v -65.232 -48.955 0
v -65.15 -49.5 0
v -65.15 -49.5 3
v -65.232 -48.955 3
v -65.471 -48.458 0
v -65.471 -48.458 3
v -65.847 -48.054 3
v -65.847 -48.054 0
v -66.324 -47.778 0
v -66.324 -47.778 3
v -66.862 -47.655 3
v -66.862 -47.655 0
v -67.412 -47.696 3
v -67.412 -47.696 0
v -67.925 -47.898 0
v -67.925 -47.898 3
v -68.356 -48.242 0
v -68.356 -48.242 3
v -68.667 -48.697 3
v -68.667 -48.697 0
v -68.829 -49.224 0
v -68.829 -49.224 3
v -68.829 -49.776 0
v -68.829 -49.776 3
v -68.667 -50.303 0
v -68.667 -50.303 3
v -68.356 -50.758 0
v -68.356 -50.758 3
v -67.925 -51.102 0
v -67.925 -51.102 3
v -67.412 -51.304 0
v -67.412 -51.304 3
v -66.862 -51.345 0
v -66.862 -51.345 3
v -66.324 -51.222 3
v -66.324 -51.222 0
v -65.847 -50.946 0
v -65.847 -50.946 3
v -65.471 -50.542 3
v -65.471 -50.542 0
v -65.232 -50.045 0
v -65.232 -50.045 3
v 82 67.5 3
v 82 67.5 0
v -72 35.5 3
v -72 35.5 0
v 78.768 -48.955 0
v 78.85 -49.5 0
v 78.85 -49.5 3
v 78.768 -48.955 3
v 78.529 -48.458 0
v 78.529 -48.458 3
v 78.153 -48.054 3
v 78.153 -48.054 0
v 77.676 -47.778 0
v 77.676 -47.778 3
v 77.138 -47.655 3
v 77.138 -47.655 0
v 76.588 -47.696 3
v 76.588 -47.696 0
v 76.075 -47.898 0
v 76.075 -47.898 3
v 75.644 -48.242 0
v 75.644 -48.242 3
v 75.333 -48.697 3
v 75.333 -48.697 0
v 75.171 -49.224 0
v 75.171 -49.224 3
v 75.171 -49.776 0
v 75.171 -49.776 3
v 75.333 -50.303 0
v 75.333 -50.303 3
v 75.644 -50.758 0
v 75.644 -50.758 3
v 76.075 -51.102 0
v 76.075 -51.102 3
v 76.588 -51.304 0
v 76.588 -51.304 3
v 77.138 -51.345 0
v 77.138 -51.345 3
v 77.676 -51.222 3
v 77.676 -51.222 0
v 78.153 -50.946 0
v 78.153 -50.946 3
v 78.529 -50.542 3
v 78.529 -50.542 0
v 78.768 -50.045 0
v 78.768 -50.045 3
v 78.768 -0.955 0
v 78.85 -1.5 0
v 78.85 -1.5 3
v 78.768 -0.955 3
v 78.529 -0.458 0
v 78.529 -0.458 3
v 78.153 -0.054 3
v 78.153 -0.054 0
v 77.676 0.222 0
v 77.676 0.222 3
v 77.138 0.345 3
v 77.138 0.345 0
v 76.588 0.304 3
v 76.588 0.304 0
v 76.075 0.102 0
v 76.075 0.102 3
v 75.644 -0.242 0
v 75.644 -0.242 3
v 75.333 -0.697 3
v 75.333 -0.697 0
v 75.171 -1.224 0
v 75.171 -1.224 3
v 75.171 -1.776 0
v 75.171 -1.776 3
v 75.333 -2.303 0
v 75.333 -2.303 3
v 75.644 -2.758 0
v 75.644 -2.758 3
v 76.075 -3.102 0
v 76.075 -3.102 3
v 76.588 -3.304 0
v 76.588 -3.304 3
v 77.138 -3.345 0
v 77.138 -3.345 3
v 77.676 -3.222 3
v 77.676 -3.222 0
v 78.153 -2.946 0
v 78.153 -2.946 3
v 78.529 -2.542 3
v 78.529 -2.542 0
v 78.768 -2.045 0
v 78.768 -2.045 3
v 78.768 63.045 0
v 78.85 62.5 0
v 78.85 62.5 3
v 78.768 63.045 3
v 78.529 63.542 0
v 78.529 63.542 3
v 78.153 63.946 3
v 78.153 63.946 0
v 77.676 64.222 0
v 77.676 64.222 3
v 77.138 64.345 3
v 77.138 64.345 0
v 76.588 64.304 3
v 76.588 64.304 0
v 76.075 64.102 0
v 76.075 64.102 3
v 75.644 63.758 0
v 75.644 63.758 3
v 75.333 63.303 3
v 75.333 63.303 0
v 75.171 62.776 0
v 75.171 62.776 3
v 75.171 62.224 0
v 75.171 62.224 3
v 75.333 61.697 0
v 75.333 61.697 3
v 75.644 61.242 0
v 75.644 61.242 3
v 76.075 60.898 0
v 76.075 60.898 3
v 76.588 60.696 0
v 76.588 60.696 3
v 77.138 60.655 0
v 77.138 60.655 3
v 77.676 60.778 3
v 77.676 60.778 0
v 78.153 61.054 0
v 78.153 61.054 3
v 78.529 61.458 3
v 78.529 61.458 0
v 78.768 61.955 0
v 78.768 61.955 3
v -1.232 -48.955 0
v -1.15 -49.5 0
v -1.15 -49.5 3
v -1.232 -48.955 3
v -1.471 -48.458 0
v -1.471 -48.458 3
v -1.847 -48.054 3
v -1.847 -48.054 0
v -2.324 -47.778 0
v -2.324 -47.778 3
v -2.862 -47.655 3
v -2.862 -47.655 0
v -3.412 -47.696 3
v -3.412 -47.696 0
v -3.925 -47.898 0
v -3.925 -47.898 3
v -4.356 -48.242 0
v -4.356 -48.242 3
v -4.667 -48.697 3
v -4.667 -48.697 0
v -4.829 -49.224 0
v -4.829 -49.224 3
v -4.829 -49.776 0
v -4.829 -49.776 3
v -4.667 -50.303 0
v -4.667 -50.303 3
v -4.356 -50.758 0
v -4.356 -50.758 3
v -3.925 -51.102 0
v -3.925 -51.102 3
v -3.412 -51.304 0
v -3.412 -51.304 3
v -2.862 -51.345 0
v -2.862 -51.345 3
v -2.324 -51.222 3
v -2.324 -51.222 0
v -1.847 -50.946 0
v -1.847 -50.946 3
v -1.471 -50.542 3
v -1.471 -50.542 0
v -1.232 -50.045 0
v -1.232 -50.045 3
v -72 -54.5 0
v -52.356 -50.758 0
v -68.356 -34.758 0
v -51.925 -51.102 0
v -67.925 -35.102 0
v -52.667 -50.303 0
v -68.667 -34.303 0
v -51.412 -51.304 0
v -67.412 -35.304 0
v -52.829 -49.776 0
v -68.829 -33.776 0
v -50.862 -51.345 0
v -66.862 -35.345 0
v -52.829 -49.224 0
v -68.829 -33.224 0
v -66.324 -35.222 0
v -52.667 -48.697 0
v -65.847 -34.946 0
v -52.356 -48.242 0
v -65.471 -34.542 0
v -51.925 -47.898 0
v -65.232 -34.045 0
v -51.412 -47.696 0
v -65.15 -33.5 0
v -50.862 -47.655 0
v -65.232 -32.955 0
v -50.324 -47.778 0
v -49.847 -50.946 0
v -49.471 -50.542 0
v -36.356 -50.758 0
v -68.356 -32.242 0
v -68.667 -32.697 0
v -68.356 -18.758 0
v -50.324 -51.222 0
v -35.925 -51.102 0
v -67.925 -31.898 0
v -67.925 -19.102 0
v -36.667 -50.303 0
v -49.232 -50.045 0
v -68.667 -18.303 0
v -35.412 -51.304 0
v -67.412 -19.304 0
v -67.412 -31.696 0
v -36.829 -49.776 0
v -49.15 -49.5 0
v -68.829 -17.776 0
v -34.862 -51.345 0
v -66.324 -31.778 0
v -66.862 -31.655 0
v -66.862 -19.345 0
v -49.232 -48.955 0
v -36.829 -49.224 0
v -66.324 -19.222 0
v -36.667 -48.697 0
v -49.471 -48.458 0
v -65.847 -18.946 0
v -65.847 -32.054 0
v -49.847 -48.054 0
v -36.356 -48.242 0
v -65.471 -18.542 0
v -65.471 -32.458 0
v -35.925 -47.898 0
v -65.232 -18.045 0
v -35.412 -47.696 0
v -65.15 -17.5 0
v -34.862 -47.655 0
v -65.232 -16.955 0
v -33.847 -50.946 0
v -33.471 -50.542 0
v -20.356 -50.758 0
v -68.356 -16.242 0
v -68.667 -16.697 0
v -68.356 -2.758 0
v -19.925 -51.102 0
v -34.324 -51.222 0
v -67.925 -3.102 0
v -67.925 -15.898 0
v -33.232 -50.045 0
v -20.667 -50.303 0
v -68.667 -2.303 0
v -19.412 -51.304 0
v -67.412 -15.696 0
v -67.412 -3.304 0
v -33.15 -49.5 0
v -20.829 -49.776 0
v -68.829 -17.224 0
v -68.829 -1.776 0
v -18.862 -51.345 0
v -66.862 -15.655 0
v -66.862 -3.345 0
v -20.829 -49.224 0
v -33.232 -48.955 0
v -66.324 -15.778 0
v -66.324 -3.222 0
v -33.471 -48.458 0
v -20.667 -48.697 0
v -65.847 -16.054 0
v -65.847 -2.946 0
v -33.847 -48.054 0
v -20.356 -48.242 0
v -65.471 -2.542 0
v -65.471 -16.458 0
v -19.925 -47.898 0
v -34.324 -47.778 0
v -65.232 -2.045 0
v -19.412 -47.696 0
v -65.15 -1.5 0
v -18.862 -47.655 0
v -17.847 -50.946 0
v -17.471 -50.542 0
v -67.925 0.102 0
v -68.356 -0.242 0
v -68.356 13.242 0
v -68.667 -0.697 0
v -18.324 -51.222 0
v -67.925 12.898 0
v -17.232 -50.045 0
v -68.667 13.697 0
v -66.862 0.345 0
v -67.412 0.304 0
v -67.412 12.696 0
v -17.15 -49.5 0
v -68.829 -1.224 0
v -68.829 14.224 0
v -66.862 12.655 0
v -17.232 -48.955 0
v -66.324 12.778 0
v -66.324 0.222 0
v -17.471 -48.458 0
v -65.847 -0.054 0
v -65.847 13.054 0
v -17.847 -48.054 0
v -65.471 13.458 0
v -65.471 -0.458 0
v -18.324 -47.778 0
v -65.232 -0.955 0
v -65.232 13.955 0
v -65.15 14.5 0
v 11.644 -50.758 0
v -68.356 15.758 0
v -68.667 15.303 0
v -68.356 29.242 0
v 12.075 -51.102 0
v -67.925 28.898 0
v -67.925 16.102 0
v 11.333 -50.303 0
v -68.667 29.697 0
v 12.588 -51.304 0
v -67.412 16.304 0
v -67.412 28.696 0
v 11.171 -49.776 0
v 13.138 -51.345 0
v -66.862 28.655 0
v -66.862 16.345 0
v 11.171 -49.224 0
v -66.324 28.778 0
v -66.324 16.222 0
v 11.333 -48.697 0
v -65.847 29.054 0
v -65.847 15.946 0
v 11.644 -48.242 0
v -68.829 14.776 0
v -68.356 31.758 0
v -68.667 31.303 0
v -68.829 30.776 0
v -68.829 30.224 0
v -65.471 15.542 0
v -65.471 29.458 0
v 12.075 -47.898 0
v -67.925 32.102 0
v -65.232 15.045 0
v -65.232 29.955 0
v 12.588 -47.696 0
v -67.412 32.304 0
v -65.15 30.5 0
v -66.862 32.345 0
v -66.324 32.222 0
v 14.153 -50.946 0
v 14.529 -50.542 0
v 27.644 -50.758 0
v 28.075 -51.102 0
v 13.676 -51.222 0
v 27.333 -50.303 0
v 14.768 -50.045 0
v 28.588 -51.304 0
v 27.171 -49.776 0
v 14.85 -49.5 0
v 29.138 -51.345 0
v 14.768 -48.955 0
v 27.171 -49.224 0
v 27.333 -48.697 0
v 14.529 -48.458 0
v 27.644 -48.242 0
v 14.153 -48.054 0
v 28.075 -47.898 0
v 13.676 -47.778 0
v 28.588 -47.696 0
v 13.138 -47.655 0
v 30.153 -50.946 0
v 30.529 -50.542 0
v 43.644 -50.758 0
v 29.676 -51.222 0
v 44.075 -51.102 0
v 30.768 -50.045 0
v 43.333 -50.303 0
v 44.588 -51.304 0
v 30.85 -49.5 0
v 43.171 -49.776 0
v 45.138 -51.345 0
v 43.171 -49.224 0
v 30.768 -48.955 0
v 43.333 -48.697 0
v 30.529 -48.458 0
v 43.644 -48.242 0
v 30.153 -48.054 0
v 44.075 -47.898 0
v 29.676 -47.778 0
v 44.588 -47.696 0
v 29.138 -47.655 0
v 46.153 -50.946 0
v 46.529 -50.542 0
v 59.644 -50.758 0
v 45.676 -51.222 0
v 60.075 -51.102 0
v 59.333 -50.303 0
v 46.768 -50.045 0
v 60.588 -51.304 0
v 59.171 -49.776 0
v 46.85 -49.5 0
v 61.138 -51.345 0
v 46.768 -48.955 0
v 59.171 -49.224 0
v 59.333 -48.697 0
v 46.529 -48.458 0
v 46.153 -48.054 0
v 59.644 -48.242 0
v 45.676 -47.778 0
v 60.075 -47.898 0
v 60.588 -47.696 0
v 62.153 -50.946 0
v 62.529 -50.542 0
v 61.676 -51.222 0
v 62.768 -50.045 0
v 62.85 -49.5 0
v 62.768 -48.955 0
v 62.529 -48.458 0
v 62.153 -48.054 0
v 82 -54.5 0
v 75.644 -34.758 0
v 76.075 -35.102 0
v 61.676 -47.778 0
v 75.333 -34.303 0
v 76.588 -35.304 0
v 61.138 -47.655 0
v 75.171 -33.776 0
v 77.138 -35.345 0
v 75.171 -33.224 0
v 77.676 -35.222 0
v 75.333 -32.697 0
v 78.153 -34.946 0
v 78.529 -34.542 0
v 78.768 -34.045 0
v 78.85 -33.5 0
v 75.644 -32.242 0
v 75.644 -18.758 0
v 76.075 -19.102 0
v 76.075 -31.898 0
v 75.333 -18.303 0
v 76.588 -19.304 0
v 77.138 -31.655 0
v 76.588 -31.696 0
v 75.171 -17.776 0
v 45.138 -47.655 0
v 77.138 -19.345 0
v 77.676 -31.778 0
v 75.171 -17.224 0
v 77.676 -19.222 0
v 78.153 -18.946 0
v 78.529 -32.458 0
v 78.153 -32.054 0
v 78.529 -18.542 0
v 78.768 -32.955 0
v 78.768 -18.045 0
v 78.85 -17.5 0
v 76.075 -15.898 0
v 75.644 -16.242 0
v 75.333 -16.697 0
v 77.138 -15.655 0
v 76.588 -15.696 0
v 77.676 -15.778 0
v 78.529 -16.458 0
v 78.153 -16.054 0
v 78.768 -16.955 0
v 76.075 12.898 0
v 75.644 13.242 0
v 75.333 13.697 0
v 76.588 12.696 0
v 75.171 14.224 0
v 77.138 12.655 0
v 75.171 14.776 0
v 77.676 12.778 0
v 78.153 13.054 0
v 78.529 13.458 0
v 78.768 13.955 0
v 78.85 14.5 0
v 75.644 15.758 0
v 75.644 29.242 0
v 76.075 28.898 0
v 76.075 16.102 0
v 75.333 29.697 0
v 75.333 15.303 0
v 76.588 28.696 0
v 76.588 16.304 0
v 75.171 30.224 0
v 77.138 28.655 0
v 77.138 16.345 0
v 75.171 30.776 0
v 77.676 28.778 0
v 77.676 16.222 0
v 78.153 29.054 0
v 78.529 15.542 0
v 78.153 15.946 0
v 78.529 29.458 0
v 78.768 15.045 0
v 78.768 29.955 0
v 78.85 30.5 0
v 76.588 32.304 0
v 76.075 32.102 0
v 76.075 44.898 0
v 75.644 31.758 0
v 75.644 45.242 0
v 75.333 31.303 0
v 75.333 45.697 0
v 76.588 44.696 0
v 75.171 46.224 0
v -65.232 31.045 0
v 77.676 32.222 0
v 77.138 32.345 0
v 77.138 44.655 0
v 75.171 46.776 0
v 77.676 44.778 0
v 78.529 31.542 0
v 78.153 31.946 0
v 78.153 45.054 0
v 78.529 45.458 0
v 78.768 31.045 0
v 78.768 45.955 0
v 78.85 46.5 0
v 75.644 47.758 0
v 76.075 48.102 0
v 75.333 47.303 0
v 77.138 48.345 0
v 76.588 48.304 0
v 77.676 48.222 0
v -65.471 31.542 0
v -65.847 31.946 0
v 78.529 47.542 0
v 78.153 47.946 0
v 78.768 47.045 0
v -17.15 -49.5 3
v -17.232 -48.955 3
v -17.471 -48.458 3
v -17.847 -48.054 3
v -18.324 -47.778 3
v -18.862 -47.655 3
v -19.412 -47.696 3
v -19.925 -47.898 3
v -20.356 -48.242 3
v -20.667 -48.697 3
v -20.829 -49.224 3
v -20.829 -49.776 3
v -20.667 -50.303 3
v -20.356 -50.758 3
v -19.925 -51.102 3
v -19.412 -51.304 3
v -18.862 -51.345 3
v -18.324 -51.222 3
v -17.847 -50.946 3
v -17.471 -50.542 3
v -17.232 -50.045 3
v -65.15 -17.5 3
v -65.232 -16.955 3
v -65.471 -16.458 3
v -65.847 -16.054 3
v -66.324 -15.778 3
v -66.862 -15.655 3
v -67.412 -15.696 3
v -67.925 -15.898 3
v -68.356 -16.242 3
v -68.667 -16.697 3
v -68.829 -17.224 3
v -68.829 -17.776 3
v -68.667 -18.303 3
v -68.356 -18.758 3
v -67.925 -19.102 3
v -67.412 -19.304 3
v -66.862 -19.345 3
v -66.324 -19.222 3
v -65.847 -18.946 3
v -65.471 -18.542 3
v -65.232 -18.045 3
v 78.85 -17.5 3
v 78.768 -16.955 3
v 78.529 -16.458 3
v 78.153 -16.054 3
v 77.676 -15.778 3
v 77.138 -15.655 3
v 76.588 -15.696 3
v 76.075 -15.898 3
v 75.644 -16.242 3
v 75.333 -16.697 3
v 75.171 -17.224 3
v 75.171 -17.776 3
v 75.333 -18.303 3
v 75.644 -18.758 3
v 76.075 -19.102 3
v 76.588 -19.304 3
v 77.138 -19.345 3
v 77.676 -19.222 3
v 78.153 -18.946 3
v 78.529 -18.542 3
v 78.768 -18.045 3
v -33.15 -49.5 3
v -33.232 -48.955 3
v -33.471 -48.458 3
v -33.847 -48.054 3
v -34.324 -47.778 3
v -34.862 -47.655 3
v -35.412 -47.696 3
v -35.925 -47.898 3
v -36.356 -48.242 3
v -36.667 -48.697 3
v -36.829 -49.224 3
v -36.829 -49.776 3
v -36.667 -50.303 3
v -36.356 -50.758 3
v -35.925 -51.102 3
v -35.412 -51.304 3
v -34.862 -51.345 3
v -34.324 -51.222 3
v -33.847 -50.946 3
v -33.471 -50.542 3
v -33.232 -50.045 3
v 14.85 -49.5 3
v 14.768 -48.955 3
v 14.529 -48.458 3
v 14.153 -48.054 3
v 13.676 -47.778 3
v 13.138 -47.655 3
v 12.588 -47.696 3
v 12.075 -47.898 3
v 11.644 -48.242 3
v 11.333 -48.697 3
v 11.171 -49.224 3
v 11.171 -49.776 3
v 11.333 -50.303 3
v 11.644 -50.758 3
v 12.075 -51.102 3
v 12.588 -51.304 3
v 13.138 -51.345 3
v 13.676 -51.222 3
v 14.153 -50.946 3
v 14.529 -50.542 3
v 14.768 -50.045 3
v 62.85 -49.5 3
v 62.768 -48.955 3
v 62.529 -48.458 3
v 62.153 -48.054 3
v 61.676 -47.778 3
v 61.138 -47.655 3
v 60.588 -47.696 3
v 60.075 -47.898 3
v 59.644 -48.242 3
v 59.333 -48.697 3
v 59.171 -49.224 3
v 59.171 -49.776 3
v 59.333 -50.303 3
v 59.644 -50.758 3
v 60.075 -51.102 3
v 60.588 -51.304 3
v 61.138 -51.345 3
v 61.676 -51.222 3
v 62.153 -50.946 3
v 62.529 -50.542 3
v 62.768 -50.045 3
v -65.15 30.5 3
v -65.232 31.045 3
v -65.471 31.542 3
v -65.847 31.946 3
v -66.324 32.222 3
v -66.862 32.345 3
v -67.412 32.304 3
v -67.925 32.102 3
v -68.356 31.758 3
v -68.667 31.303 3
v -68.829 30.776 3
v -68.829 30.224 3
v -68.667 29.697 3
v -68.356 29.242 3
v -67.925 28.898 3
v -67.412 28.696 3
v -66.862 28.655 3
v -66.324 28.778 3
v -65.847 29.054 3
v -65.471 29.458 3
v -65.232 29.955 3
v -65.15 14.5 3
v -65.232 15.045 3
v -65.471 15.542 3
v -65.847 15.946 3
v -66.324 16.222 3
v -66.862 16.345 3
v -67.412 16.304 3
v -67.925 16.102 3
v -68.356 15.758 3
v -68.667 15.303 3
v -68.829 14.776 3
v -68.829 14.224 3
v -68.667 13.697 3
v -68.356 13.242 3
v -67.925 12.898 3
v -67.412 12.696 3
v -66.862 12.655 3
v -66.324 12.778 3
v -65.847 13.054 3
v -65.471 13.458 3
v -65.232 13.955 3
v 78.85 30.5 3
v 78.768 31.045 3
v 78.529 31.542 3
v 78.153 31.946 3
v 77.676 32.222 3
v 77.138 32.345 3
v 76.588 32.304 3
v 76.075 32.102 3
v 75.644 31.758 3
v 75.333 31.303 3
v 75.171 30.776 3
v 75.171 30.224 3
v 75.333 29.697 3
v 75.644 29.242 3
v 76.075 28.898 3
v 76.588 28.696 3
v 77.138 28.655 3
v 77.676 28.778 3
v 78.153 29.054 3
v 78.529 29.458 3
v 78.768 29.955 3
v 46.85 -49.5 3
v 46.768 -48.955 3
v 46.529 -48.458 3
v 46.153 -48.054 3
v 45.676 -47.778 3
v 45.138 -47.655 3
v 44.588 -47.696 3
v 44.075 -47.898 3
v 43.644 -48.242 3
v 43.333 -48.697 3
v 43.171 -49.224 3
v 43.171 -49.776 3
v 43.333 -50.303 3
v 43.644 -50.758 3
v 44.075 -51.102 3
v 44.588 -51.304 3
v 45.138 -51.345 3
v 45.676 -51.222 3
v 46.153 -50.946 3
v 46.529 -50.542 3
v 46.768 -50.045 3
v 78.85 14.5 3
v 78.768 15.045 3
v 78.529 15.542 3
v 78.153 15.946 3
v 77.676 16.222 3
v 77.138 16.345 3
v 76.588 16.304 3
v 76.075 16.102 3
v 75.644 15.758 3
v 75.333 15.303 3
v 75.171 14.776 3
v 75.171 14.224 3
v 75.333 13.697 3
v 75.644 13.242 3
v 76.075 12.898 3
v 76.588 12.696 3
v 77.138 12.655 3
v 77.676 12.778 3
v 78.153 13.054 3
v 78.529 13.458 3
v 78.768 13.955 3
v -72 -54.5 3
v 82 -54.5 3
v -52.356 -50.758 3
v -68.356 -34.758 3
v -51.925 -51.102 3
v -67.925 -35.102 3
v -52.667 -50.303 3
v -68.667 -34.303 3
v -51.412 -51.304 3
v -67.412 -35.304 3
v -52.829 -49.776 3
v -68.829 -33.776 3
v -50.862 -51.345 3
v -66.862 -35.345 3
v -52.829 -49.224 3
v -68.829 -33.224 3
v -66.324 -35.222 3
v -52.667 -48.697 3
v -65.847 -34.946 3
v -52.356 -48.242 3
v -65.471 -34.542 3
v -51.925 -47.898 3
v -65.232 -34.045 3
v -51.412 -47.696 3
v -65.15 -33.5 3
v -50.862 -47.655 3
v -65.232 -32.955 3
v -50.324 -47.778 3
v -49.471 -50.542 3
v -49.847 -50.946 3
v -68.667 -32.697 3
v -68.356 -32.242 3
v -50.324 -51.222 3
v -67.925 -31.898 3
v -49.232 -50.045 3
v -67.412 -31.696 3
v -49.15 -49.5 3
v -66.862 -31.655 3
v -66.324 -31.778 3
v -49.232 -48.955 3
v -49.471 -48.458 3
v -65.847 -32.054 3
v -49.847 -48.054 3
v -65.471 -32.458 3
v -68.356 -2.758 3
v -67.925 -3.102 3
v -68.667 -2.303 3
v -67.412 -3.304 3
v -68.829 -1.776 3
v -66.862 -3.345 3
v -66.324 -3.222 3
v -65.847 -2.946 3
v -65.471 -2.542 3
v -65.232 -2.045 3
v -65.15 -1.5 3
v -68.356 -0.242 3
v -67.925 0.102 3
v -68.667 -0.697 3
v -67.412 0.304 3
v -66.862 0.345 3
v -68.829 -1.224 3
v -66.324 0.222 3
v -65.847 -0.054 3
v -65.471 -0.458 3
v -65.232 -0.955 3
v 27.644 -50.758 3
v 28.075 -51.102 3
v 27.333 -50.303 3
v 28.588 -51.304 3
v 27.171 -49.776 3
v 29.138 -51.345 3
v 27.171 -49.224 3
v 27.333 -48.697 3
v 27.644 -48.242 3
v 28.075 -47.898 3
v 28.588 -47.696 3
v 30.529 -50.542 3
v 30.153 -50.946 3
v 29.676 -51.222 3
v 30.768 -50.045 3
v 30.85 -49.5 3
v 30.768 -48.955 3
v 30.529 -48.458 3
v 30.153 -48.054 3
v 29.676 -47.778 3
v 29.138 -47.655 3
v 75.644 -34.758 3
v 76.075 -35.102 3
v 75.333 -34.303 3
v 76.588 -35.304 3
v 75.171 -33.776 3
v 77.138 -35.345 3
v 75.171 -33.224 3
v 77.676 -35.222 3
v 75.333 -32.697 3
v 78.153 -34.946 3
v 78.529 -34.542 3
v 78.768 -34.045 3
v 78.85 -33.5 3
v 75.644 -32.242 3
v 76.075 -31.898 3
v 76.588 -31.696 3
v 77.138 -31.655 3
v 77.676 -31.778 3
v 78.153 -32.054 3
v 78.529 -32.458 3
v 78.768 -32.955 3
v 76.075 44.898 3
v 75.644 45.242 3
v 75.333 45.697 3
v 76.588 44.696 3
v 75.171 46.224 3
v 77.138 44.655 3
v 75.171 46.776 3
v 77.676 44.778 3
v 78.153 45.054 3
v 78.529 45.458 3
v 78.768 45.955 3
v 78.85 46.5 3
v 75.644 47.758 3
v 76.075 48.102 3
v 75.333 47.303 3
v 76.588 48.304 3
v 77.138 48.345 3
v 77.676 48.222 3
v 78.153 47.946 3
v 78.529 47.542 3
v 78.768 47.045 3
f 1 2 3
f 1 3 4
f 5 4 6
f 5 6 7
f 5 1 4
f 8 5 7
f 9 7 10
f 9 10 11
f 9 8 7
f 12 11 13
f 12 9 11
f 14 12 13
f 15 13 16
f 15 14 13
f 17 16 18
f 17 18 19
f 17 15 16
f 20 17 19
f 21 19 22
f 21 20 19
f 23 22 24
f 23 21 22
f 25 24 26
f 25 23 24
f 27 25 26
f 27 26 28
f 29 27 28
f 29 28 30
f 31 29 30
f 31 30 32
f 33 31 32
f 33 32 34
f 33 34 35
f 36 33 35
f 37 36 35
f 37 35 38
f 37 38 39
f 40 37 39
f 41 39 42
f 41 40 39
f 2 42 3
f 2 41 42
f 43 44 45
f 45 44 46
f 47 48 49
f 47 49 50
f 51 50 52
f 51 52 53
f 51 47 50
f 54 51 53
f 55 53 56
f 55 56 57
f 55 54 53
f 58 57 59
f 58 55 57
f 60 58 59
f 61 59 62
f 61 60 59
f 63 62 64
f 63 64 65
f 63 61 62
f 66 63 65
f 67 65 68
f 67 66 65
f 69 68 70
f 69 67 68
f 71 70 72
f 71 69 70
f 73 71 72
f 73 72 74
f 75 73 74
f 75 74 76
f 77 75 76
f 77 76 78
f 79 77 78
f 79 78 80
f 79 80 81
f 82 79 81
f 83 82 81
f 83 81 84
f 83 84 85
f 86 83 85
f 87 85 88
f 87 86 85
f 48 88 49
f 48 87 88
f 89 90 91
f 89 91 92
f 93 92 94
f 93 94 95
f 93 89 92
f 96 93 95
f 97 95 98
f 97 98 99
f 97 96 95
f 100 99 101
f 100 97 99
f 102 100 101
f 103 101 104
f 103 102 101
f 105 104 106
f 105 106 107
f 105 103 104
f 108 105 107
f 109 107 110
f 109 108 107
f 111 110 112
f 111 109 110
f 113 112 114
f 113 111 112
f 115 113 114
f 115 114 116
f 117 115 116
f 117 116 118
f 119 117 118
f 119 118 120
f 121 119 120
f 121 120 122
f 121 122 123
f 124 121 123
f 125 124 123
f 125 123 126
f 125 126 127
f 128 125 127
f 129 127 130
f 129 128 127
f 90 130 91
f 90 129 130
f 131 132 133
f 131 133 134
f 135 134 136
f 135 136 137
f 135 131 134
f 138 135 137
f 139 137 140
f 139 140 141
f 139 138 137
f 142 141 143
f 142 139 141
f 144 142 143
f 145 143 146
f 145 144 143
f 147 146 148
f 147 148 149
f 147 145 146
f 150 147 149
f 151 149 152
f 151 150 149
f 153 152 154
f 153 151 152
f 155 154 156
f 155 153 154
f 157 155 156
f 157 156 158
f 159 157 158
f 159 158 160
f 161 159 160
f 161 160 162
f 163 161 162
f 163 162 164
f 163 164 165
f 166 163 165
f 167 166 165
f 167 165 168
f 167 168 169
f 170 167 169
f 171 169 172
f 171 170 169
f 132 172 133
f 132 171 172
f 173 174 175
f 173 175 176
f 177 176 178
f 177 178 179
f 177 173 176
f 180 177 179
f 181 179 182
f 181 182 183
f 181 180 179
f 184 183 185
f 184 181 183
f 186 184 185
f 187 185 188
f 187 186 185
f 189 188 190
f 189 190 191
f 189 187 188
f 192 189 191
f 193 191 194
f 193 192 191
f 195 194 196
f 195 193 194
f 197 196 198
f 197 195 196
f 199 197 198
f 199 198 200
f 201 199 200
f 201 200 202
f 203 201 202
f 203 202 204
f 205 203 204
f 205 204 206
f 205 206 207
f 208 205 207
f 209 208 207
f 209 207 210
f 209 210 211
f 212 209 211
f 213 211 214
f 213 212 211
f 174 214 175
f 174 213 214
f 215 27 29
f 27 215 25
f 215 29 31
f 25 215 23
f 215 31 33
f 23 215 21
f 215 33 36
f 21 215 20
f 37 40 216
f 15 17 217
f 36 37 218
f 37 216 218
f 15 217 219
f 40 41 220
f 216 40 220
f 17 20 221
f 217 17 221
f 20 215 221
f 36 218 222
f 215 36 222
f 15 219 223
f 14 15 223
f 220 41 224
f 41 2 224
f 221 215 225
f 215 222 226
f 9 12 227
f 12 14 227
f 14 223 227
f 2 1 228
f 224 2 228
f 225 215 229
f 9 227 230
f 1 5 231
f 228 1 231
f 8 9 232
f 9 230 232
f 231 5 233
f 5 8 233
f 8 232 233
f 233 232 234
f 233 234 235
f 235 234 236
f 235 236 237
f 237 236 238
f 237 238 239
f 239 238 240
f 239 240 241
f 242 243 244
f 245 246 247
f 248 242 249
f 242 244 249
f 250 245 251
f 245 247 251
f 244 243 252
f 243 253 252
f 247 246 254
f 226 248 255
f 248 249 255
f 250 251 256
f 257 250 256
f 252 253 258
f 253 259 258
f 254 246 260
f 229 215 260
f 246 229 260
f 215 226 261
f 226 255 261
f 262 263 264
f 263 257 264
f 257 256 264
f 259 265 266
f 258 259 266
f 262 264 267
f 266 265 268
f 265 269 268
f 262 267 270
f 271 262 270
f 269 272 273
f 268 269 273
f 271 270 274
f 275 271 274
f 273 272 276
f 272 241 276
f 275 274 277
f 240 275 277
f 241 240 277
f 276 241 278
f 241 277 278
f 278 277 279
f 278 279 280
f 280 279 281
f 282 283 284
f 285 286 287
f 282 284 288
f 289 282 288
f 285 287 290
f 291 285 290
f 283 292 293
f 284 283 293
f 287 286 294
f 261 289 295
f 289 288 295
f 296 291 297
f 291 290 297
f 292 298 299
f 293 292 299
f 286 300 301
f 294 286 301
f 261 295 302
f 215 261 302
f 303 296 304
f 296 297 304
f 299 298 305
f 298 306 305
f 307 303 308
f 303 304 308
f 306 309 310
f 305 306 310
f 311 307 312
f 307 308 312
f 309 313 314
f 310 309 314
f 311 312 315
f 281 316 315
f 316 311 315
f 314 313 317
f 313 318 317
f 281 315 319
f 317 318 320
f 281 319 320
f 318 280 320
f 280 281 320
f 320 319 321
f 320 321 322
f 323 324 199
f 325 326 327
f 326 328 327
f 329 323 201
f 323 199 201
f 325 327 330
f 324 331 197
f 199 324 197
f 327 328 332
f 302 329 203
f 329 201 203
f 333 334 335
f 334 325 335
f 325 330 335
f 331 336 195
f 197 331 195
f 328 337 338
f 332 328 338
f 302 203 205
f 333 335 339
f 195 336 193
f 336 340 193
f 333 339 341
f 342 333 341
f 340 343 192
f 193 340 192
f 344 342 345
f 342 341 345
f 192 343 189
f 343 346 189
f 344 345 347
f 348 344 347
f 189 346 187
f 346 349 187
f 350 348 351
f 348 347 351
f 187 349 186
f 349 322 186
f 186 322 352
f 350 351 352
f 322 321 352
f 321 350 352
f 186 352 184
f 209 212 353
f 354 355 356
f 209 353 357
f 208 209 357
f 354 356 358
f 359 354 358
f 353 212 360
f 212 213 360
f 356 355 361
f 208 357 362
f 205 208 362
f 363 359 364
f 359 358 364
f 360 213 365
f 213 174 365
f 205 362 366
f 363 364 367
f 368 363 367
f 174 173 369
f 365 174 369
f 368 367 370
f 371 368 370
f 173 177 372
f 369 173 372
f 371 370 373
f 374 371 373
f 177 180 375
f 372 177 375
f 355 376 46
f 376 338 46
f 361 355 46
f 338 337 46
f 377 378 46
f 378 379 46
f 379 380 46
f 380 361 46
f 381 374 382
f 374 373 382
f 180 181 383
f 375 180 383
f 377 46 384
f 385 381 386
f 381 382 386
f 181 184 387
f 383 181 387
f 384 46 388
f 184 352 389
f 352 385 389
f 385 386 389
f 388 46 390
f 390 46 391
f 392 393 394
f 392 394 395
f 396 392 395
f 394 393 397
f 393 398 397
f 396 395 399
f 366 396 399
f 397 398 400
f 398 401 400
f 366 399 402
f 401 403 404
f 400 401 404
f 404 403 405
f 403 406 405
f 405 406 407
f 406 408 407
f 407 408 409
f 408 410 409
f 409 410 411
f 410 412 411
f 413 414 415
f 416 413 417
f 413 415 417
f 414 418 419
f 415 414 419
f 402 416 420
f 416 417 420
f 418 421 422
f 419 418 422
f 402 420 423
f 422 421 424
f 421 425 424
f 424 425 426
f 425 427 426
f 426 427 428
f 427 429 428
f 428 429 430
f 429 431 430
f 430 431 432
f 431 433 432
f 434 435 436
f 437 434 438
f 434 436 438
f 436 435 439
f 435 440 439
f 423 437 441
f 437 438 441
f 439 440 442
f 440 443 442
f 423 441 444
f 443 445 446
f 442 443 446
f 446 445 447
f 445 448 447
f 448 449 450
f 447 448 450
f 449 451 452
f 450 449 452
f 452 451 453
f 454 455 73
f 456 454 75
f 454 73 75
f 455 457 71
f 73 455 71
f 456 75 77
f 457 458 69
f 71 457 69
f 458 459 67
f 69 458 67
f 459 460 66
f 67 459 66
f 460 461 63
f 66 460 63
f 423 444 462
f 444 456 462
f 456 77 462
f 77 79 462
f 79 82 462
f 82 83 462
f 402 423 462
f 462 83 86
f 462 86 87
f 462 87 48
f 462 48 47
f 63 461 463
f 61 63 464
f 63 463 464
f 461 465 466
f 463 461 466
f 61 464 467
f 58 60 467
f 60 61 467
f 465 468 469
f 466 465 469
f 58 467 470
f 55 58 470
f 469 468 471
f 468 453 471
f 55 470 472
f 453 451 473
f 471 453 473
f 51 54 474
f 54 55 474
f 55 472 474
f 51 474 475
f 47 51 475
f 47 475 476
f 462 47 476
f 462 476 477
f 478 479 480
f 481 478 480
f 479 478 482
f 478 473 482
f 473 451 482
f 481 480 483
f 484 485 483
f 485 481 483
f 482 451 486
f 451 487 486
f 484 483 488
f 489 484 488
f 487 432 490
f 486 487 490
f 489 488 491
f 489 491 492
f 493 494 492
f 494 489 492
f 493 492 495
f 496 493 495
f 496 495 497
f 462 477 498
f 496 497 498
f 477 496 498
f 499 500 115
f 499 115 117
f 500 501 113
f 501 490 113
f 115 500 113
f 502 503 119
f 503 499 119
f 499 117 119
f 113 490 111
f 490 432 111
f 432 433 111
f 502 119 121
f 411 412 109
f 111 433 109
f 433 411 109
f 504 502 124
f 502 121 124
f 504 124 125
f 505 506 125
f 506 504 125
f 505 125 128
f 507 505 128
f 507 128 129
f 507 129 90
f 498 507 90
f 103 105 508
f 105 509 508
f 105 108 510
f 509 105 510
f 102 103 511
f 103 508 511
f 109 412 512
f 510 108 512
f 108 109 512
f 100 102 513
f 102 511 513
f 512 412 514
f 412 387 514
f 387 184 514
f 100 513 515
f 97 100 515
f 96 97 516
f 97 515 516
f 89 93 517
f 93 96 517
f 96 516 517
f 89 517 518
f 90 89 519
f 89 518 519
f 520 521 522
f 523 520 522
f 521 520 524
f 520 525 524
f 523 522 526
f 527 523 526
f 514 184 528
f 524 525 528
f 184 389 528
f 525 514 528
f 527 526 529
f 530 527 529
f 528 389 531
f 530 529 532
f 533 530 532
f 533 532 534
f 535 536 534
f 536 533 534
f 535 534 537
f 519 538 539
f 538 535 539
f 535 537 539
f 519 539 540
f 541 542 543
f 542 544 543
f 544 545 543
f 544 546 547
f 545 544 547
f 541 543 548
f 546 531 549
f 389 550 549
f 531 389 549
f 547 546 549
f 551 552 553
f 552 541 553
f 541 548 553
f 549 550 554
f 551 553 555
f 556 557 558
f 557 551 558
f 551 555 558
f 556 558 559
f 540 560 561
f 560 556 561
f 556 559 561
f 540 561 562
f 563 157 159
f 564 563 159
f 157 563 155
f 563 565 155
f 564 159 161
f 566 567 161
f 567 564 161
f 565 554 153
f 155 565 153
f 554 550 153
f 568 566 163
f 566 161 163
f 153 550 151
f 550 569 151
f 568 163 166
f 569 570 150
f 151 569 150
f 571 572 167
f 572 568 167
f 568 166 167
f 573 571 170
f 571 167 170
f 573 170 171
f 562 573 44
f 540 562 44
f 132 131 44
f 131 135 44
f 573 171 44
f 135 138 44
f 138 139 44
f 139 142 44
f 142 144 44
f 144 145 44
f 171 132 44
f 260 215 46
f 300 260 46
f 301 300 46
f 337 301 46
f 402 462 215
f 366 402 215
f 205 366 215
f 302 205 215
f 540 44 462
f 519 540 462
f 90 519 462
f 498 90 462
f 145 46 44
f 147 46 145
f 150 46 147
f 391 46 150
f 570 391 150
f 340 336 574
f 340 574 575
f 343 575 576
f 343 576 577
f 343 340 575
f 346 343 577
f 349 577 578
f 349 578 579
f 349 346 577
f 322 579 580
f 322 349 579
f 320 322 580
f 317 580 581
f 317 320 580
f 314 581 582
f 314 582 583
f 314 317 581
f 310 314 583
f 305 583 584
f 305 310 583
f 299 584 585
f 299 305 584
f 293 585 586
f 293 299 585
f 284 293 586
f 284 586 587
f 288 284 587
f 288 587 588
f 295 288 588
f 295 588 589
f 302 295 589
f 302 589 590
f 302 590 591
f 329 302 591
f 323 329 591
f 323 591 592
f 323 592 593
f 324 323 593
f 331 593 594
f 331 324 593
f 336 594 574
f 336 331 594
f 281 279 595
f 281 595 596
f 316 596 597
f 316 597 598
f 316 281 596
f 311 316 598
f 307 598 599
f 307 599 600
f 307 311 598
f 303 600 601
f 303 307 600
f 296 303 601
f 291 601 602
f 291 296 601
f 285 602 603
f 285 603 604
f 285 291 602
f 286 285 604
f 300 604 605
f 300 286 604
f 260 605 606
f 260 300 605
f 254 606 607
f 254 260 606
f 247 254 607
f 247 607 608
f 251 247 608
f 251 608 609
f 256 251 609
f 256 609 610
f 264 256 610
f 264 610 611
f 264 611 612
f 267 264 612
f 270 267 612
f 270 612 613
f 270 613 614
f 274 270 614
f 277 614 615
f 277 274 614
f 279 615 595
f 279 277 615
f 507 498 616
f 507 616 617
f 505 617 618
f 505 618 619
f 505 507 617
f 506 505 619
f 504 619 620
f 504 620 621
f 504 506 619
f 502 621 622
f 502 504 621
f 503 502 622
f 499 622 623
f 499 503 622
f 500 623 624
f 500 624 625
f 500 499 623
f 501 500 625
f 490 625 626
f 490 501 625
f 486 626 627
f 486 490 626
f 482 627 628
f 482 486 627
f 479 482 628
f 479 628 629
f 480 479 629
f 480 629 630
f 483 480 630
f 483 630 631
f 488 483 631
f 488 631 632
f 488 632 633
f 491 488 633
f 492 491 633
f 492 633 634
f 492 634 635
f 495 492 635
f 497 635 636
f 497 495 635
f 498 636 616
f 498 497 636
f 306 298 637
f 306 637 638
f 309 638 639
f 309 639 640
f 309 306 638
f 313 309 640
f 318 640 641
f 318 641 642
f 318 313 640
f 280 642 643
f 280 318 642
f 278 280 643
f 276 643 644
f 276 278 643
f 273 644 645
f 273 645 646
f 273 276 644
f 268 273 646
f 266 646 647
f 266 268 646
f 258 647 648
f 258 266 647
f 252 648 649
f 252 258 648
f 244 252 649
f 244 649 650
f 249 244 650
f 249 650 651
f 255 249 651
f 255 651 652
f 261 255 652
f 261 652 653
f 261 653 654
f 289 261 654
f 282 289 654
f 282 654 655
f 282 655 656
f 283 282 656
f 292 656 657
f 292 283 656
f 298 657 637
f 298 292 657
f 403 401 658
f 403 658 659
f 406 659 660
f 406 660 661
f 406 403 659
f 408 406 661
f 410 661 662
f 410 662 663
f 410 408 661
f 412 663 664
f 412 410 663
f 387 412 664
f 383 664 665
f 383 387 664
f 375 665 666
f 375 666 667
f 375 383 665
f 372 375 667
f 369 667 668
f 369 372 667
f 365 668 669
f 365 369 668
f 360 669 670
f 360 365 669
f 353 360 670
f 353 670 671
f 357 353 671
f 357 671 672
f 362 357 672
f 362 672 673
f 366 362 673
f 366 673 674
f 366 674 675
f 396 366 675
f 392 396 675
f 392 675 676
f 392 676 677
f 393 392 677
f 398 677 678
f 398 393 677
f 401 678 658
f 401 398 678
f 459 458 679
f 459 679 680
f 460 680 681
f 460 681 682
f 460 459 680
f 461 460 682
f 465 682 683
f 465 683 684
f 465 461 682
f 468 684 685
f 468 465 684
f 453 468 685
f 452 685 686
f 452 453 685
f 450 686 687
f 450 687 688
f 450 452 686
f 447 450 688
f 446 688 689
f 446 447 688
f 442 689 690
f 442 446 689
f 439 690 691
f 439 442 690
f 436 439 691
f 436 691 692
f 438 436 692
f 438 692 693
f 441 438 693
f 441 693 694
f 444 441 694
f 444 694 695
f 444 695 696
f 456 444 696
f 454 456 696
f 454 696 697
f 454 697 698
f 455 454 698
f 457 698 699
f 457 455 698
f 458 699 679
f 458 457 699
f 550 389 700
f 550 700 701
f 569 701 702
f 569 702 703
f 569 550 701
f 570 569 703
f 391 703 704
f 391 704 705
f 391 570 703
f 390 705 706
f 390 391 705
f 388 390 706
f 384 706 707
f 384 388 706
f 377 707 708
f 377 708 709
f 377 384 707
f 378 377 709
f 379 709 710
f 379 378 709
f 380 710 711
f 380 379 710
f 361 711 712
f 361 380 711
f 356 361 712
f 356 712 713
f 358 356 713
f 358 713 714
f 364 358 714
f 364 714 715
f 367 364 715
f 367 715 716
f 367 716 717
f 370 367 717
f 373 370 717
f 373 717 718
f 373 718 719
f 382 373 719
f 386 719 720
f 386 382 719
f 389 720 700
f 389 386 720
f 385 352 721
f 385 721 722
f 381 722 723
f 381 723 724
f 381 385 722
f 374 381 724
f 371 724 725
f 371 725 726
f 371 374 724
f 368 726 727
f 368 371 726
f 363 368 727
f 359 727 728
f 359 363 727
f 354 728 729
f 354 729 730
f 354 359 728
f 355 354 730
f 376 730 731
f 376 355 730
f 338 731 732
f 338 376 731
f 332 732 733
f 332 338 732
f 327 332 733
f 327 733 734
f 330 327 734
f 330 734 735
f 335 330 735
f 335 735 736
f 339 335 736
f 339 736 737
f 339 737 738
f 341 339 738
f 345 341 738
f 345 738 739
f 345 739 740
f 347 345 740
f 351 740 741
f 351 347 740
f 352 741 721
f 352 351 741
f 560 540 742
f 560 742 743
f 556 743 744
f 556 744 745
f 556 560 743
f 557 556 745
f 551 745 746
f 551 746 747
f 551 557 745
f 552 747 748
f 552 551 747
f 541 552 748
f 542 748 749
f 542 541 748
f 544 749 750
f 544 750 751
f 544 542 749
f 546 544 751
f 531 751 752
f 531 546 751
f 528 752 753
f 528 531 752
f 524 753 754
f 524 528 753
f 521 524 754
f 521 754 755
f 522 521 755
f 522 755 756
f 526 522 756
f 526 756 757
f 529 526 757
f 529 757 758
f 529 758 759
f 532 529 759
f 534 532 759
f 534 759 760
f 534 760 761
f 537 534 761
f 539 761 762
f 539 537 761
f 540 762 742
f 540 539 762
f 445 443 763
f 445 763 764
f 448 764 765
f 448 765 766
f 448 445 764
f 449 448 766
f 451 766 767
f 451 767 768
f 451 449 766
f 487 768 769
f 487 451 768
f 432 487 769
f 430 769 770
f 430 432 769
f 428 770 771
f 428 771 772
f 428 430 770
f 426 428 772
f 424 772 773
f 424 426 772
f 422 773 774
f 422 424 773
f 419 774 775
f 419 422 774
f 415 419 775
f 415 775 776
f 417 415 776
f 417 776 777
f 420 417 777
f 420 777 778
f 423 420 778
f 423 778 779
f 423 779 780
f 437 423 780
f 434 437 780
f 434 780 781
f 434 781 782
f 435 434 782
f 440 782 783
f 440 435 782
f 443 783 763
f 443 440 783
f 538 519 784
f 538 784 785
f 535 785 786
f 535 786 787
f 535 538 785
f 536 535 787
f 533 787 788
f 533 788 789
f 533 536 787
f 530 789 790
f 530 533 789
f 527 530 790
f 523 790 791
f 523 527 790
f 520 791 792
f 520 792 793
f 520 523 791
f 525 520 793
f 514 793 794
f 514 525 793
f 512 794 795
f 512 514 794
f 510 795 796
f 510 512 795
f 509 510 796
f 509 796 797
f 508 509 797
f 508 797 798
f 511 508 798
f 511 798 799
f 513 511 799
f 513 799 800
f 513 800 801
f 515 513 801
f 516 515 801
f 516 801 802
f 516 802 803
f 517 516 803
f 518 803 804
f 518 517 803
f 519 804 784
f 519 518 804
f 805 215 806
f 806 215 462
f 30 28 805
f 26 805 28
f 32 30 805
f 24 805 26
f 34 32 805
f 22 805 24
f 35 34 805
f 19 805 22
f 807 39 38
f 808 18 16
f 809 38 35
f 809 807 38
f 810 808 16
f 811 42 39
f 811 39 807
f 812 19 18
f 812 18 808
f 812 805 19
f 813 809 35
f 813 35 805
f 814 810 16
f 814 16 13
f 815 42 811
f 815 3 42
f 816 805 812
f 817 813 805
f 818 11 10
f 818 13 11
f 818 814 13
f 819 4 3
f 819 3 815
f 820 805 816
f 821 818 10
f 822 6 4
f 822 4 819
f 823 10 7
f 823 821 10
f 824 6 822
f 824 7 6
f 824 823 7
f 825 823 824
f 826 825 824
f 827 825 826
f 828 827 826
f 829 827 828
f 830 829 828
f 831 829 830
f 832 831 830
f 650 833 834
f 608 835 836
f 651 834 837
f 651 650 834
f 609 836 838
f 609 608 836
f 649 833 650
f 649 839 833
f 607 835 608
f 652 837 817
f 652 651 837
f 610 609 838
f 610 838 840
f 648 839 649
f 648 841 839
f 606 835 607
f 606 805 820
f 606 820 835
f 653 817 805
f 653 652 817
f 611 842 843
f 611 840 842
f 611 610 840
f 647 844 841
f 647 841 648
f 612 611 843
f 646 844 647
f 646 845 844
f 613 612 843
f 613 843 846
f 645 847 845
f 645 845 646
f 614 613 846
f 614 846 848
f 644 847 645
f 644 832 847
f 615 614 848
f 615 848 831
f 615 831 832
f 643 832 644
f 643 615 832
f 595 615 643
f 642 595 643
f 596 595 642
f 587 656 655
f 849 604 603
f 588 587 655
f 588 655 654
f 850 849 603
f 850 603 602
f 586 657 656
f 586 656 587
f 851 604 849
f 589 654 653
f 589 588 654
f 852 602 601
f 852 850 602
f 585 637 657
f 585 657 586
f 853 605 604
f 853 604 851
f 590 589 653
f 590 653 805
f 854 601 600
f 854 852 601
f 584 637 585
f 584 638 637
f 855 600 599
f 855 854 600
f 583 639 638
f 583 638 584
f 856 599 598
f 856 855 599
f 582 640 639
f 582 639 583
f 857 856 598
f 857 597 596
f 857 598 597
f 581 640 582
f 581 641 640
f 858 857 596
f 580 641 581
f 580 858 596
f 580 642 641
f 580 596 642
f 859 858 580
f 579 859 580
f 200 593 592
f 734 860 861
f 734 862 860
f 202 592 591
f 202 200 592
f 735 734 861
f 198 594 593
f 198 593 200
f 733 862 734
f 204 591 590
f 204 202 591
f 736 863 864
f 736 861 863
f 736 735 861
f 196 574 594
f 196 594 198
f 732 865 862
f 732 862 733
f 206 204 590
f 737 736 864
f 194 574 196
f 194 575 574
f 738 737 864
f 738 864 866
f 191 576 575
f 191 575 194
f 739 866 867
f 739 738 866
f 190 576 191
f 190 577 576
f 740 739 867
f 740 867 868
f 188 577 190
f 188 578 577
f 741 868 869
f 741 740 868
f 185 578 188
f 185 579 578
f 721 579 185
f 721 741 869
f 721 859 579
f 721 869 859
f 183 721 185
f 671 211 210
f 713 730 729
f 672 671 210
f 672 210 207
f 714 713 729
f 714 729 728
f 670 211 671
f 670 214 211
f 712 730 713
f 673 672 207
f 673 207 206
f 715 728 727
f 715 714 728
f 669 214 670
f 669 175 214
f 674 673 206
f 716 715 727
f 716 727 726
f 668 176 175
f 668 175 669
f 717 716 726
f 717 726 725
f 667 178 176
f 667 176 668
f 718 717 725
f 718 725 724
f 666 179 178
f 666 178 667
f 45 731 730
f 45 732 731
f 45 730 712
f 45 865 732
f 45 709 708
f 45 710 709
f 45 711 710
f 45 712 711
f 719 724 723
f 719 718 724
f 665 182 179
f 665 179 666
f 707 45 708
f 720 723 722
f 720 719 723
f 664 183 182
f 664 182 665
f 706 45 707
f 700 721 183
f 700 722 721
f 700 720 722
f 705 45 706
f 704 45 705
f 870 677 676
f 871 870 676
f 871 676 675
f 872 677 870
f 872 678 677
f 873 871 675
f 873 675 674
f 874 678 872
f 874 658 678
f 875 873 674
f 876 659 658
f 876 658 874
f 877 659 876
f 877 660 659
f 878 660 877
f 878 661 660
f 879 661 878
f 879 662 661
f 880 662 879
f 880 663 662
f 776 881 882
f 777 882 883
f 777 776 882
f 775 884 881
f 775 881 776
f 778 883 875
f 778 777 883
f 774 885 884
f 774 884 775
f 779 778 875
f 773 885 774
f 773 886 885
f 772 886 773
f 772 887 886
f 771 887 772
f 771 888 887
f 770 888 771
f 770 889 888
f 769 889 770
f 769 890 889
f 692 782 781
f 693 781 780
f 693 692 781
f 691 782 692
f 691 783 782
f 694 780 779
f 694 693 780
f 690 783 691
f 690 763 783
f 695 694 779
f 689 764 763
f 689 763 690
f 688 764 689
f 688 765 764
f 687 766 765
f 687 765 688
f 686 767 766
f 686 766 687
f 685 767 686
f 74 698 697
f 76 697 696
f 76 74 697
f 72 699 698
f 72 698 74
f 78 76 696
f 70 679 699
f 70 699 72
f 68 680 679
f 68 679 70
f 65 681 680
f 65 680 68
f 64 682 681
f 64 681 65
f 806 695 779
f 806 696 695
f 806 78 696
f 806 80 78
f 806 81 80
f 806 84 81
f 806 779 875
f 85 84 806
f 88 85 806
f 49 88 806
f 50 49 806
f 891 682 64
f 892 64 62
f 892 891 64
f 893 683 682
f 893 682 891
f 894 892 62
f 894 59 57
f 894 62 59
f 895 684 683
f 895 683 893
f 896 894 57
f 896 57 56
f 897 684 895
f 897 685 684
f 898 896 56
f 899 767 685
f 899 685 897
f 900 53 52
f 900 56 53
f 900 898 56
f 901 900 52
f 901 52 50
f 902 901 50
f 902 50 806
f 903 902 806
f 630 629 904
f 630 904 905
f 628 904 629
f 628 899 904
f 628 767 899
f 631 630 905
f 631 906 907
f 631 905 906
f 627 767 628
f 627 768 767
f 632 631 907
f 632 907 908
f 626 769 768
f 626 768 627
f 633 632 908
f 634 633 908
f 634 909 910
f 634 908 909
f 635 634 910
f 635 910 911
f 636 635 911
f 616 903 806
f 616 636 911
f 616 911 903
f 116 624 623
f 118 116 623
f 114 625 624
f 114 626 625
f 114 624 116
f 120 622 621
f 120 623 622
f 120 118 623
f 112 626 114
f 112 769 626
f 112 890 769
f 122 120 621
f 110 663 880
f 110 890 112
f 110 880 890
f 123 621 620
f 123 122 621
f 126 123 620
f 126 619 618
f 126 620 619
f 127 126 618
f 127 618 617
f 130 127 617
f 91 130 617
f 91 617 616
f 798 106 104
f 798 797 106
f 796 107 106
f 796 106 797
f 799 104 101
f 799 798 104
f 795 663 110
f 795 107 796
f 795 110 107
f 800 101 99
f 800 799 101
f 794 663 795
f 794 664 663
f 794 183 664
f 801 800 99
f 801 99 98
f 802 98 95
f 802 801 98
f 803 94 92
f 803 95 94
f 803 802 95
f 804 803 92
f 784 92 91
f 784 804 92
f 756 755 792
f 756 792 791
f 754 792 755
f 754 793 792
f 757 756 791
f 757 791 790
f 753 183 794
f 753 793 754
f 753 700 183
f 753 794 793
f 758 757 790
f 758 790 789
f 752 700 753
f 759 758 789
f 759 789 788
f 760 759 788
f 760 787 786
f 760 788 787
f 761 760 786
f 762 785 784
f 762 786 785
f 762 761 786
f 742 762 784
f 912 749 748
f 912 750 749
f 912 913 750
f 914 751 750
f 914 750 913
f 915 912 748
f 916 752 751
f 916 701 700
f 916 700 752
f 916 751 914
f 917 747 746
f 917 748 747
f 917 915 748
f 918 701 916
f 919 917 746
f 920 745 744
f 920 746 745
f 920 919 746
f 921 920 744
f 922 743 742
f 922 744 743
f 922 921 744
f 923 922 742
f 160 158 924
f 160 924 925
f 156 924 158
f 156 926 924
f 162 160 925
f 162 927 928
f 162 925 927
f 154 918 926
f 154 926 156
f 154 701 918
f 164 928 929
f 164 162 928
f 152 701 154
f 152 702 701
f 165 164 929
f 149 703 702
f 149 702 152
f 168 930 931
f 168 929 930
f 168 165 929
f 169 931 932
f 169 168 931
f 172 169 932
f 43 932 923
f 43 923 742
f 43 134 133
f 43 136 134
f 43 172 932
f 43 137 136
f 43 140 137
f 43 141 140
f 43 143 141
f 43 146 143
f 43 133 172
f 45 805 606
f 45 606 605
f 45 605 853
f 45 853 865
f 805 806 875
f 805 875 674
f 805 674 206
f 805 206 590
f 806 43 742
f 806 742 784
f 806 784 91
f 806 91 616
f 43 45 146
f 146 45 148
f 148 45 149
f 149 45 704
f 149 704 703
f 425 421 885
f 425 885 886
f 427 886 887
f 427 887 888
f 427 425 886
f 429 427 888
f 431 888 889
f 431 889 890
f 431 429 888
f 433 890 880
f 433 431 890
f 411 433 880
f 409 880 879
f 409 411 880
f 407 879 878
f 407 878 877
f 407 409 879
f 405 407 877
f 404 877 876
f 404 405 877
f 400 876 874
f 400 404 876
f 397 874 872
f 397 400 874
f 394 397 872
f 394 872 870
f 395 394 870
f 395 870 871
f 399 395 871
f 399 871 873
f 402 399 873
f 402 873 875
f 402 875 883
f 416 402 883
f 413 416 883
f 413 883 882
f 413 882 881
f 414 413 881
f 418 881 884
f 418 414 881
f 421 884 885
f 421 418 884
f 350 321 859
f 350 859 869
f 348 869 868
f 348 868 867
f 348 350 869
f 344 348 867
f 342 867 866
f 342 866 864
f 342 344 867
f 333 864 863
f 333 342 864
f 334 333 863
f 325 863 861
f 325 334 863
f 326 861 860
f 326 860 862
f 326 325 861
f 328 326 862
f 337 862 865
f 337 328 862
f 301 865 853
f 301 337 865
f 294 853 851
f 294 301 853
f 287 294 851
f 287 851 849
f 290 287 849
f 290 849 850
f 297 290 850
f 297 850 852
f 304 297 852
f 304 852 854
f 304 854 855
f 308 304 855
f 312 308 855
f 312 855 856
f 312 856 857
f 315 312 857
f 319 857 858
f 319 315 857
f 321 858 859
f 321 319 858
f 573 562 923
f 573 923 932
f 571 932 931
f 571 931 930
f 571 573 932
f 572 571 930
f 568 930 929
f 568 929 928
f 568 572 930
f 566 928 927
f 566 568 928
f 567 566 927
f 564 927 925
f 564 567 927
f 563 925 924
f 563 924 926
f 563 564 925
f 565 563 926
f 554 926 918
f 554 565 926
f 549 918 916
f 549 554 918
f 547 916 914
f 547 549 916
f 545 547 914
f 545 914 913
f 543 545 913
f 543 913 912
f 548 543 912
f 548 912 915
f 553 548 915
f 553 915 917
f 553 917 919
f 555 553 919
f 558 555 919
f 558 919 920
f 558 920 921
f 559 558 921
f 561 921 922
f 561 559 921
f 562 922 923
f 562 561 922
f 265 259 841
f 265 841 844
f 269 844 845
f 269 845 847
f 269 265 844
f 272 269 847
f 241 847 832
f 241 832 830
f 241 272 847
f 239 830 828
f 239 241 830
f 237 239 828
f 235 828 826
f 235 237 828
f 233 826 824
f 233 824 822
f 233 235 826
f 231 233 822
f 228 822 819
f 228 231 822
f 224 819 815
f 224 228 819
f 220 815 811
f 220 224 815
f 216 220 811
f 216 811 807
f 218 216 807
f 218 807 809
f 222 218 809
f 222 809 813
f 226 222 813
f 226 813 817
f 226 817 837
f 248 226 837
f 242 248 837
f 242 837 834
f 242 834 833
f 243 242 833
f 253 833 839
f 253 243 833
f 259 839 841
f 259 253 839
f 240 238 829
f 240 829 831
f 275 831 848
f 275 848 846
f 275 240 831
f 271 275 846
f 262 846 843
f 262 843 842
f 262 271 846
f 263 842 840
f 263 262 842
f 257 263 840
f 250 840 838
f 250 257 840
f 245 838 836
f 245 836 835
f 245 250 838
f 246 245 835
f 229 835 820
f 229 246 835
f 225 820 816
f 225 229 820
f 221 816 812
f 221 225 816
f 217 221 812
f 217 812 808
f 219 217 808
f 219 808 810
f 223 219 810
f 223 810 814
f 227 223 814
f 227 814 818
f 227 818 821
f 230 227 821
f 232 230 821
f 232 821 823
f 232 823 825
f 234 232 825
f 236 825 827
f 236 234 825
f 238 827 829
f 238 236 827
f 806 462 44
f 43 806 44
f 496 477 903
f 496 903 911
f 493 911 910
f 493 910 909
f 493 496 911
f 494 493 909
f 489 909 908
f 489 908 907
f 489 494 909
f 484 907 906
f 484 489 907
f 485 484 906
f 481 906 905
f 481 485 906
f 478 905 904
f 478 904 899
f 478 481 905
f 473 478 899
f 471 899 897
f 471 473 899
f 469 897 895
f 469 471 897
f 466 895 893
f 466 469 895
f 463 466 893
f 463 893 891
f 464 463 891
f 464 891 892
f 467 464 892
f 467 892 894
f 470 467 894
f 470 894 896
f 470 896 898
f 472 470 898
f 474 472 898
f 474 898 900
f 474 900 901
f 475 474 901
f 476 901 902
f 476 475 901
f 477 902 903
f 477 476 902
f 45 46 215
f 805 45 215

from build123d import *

# Parameters (mm, degrees)
F0_R     = 1.85
F1_DEPTH = 3


with BuildPart() as f1:
    # F0 (on Top) → F1 (new body)
    with BuildSketch(Plane.XY):
        Polygon((-72, 35.5), (-72, -54.5), (82, -54.5), (82, 67.5), align=None)
        with Locations((-67, -49.5)):
            Circle(F0_R, mode=Mode.SUBTRACT)
        with Locations((-51, -49.5)):
            Circle(F0_R, mode=Mode.SUBTRACT)
        with Locations((-35, -49.5)):
            Circle(F0_R, mode=Mode.SUBTRACT)
        with Locations((-67, -33.5)):
            Circle(F0_R, mode=Mode.SUBTRACT)
        with Locations((-19, -49.5)):
            Circle(F0_R, mode=Mode.SUBTRACT)
        with Locations((-3, -49.5)):
            Circle(F0_R, mode=Mode.SUBTRACT)
        with Locations((-67, -17.5)):
            Circle(F0_R, mode=Mode.SUBTRACT)
        with Locations((-67, -1.5)):
            Circle(F0_R, mode=Mode.SUBTRACT)
        with Locations((13, -49.5)):
            Circle(F0_R, mode=Mode.SUBTRACT)
        with Locations((29, -49.5)):
            Circle(F0_R, mode=Mode.SUBTRACT)
        with Locations((45, -49.5)):
            Circle(F0_R, mode=Mode.SUBTRACT)
        with Locations((61, -49.5)):
            Circle(F0_R, mode=Mode.SUBTRACT)
        with Locations((77, -49.5)):
            Circle(F0_R, mode=Mode.SUBTRACT)
        with Locations((77, -33.5)):
            Circle(F0_R, mode=Mode.SUBTRACT)
        with Locations((77, -17.5)):
            Circle(F0_R, mode=Mode.SUBTRACT)
        with Locations((77, -1.5)):
            Circle(F0_R, mode=Mode.SUBTRACT)
        with Locations((-67, 14.5)):
            Circle(F0_R, mode=Mode.SUBTRACT)
        with Locations((-67, 30.5)):
            Circle(F0_R, mode=Mode.SUBTRACT)
        with Locations((77, 14.5)):
            Circle(F0_R, mode=Mode.SUBTRACT)
        with Locations((77, 30.5)):
            Circle(F0_R, mode=Mode.SUBTRACT)
        with Locations((77, 46.5)):
            Circle(F0_R, mode=Mode.SUBTRACT)
        with Locations((77, 62.5)):
            Circle(F0_R, mode=Mode.SUBTRACT)
    extrude(amount=F1_DEPTH)


solid = f1.part
